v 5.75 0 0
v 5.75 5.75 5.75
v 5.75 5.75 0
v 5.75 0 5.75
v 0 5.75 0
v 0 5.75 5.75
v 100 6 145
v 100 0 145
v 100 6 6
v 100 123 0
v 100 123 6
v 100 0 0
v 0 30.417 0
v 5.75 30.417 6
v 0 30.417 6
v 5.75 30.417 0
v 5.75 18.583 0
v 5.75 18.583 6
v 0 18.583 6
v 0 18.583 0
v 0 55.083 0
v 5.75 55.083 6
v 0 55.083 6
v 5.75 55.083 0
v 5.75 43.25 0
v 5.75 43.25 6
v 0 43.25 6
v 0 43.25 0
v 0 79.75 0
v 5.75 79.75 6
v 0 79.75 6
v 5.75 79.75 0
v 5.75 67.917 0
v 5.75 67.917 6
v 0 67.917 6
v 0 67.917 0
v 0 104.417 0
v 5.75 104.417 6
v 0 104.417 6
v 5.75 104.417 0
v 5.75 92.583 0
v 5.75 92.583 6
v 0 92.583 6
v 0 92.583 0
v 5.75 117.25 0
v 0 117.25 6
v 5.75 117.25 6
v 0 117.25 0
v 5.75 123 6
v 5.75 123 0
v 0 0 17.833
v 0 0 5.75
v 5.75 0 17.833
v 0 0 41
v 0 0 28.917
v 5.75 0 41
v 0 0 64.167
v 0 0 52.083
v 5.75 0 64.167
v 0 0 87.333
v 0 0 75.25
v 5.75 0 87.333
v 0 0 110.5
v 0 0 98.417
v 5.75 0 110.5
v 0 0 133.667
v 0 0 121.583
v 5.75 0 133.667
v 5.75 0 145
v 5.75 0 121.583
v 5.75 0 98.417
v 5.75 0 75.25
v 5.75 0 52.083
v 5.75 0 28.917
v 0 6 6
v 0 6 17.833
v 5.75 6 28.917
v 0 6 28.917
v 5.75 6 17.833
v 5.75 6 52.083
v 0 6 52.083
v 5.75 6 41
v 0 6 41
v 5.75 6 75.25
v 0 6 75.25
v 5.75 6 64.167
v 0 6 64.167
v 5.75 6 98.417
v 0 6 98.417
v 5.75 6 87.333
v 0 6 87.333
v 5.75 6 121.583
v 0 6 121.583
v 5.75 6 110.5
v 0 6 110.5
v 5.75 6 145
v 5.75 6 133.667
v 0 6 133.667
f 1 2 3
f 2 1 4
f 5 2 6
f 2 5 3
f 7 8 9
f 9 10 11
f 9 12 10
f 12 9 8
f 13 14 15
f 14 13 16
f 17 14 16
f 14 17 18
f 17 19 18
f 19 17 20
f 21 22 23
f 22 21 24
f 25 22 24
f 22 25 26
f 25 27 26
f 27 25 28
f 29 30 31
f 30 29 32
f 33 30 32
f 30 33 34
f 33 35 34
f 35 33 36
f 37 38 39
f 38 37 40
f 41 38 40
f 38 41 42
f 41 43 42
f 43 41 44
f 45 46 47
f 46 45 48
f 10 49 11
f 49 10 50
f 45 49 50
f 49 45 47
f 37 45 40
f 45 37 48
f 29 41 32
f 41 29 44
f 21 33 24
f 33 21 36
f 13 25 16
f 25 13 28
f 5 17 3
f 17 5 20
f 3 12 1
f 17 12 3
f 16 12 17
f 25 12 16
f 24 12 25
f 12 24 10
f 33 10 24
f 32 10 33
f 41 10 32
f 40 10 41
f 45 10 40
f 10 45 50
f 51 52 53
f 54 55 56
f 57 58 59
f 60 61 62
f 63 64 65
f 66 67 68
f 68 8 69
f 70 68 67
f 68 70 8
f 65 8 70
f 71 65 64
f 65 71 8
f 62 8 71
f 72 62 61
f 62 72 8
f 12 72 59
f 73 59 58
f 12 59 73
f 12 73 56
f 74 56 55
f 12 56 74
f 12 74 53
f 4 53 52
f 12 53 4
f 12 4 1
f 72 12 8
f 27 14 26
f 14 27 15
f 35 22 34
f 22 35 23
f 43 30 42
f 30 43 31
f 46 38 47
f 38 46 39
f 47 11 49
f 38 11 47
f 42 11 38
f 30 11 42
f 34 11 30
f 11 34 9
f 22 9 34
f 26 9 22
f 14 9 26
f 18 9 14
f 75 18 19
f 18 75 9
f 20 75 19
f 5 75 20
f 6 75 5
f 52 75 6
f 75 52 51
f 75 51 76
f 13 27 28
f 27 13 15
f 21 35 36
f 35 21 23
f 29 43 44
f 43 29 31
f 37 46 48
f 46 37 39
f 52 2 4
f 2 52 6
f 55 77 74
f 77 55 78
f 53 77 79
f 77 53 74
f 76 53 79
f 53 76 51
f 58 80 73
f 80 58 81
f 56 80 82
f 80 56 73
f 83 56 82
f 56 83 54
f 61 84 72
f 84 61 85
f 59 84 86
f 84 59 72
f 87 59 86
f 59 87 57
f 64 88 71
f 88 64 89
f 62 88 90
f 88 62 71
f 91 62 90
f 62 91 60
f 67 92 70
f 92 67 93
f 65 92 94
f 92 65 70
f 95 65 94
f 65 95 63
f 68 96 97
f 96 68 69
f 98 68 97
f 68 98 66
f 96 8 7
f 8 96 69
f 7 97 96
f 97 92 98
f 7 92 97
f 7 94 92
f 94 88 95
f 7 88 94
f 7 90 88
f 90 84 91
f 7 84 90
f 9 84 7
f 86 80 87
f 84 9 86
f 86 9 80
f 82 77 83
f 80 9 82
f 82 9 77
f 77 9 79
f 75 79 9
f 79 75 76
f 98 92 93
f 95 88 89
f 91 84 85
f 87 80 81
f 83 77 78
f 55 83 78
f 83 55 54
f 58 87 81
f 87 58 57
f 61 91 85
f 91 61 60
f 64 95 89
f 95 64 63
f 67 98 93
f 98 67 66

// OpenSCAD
include <laserlib.scad>;

th = 6; // thikness

$flatPack = false;  // Toggle for whether or not to flatpack you build
$spaceing = 2;     // When flatpacking 

myWidth = 100;
myDepth = 123;
myHeight = 145;


llFlatPack(x = 0 , sizes=[myDepth,myHeight,myDepth]){
    // bottom
    llCutoutSquare(th = th, size=[myWidth,myDepth], pos=[0,0,0]){
        llFingers(startPos=[0,0,0], angle=0, length=myWidth,edge=true,startCon=[2,0], inverse = false);
        llFingers(startPos=[0,0,0], angle=90, length=myDepth,edge=true, startCon=[2,2], inverse = false);
    }

    // front
    llCutoutSquare(th = th, size=[myWidth,myHeight],pos=[0,th,0],ang=[90,0,0]){
        #llFingers(startPos = [0,0,0], endPos=[myWidth,0,0],edge=true, startCon=[2,0],inverse = true);
        llFingers(startPos = [0,50,0], angle = 0, length = myWidth,edge=false, startCon=[2,2]);
        llFingers(startPos=[0,0,0], angle=90,length=myHeight,edge=true, startCon=[2,0]);
    }

    // side1
   * llCutoutSquare(th = th, size=[myHeight,myDepth],pos=[th,0,0],ang=[0,-90,0]){
        llFingers(startPos=[0,0,0], angle=0, length = myHeight, edge=true);
        llFingers(startPos=[0,0,0], angle=90, length = myDepth, edge = true,startCon=22);
    }

    // test
    *anotherPice();
}

module testPice(){
    llCutoutSquare(th = th,size=[200,200], pos = [0,0], ang = [90,0,0]){
        fingerjoints(side = LEFT, type = OUTSIDE, count = 5);
        cutBlob(position = [100,100]){
            cube([40,40,th]);
        }
    }
}

module anotherPice(){
    llCutout(th = th, points = [[0,0],[0,100],[100,50],[100,0]], pos = [0,0], ang = [0,0]){
    }
}
